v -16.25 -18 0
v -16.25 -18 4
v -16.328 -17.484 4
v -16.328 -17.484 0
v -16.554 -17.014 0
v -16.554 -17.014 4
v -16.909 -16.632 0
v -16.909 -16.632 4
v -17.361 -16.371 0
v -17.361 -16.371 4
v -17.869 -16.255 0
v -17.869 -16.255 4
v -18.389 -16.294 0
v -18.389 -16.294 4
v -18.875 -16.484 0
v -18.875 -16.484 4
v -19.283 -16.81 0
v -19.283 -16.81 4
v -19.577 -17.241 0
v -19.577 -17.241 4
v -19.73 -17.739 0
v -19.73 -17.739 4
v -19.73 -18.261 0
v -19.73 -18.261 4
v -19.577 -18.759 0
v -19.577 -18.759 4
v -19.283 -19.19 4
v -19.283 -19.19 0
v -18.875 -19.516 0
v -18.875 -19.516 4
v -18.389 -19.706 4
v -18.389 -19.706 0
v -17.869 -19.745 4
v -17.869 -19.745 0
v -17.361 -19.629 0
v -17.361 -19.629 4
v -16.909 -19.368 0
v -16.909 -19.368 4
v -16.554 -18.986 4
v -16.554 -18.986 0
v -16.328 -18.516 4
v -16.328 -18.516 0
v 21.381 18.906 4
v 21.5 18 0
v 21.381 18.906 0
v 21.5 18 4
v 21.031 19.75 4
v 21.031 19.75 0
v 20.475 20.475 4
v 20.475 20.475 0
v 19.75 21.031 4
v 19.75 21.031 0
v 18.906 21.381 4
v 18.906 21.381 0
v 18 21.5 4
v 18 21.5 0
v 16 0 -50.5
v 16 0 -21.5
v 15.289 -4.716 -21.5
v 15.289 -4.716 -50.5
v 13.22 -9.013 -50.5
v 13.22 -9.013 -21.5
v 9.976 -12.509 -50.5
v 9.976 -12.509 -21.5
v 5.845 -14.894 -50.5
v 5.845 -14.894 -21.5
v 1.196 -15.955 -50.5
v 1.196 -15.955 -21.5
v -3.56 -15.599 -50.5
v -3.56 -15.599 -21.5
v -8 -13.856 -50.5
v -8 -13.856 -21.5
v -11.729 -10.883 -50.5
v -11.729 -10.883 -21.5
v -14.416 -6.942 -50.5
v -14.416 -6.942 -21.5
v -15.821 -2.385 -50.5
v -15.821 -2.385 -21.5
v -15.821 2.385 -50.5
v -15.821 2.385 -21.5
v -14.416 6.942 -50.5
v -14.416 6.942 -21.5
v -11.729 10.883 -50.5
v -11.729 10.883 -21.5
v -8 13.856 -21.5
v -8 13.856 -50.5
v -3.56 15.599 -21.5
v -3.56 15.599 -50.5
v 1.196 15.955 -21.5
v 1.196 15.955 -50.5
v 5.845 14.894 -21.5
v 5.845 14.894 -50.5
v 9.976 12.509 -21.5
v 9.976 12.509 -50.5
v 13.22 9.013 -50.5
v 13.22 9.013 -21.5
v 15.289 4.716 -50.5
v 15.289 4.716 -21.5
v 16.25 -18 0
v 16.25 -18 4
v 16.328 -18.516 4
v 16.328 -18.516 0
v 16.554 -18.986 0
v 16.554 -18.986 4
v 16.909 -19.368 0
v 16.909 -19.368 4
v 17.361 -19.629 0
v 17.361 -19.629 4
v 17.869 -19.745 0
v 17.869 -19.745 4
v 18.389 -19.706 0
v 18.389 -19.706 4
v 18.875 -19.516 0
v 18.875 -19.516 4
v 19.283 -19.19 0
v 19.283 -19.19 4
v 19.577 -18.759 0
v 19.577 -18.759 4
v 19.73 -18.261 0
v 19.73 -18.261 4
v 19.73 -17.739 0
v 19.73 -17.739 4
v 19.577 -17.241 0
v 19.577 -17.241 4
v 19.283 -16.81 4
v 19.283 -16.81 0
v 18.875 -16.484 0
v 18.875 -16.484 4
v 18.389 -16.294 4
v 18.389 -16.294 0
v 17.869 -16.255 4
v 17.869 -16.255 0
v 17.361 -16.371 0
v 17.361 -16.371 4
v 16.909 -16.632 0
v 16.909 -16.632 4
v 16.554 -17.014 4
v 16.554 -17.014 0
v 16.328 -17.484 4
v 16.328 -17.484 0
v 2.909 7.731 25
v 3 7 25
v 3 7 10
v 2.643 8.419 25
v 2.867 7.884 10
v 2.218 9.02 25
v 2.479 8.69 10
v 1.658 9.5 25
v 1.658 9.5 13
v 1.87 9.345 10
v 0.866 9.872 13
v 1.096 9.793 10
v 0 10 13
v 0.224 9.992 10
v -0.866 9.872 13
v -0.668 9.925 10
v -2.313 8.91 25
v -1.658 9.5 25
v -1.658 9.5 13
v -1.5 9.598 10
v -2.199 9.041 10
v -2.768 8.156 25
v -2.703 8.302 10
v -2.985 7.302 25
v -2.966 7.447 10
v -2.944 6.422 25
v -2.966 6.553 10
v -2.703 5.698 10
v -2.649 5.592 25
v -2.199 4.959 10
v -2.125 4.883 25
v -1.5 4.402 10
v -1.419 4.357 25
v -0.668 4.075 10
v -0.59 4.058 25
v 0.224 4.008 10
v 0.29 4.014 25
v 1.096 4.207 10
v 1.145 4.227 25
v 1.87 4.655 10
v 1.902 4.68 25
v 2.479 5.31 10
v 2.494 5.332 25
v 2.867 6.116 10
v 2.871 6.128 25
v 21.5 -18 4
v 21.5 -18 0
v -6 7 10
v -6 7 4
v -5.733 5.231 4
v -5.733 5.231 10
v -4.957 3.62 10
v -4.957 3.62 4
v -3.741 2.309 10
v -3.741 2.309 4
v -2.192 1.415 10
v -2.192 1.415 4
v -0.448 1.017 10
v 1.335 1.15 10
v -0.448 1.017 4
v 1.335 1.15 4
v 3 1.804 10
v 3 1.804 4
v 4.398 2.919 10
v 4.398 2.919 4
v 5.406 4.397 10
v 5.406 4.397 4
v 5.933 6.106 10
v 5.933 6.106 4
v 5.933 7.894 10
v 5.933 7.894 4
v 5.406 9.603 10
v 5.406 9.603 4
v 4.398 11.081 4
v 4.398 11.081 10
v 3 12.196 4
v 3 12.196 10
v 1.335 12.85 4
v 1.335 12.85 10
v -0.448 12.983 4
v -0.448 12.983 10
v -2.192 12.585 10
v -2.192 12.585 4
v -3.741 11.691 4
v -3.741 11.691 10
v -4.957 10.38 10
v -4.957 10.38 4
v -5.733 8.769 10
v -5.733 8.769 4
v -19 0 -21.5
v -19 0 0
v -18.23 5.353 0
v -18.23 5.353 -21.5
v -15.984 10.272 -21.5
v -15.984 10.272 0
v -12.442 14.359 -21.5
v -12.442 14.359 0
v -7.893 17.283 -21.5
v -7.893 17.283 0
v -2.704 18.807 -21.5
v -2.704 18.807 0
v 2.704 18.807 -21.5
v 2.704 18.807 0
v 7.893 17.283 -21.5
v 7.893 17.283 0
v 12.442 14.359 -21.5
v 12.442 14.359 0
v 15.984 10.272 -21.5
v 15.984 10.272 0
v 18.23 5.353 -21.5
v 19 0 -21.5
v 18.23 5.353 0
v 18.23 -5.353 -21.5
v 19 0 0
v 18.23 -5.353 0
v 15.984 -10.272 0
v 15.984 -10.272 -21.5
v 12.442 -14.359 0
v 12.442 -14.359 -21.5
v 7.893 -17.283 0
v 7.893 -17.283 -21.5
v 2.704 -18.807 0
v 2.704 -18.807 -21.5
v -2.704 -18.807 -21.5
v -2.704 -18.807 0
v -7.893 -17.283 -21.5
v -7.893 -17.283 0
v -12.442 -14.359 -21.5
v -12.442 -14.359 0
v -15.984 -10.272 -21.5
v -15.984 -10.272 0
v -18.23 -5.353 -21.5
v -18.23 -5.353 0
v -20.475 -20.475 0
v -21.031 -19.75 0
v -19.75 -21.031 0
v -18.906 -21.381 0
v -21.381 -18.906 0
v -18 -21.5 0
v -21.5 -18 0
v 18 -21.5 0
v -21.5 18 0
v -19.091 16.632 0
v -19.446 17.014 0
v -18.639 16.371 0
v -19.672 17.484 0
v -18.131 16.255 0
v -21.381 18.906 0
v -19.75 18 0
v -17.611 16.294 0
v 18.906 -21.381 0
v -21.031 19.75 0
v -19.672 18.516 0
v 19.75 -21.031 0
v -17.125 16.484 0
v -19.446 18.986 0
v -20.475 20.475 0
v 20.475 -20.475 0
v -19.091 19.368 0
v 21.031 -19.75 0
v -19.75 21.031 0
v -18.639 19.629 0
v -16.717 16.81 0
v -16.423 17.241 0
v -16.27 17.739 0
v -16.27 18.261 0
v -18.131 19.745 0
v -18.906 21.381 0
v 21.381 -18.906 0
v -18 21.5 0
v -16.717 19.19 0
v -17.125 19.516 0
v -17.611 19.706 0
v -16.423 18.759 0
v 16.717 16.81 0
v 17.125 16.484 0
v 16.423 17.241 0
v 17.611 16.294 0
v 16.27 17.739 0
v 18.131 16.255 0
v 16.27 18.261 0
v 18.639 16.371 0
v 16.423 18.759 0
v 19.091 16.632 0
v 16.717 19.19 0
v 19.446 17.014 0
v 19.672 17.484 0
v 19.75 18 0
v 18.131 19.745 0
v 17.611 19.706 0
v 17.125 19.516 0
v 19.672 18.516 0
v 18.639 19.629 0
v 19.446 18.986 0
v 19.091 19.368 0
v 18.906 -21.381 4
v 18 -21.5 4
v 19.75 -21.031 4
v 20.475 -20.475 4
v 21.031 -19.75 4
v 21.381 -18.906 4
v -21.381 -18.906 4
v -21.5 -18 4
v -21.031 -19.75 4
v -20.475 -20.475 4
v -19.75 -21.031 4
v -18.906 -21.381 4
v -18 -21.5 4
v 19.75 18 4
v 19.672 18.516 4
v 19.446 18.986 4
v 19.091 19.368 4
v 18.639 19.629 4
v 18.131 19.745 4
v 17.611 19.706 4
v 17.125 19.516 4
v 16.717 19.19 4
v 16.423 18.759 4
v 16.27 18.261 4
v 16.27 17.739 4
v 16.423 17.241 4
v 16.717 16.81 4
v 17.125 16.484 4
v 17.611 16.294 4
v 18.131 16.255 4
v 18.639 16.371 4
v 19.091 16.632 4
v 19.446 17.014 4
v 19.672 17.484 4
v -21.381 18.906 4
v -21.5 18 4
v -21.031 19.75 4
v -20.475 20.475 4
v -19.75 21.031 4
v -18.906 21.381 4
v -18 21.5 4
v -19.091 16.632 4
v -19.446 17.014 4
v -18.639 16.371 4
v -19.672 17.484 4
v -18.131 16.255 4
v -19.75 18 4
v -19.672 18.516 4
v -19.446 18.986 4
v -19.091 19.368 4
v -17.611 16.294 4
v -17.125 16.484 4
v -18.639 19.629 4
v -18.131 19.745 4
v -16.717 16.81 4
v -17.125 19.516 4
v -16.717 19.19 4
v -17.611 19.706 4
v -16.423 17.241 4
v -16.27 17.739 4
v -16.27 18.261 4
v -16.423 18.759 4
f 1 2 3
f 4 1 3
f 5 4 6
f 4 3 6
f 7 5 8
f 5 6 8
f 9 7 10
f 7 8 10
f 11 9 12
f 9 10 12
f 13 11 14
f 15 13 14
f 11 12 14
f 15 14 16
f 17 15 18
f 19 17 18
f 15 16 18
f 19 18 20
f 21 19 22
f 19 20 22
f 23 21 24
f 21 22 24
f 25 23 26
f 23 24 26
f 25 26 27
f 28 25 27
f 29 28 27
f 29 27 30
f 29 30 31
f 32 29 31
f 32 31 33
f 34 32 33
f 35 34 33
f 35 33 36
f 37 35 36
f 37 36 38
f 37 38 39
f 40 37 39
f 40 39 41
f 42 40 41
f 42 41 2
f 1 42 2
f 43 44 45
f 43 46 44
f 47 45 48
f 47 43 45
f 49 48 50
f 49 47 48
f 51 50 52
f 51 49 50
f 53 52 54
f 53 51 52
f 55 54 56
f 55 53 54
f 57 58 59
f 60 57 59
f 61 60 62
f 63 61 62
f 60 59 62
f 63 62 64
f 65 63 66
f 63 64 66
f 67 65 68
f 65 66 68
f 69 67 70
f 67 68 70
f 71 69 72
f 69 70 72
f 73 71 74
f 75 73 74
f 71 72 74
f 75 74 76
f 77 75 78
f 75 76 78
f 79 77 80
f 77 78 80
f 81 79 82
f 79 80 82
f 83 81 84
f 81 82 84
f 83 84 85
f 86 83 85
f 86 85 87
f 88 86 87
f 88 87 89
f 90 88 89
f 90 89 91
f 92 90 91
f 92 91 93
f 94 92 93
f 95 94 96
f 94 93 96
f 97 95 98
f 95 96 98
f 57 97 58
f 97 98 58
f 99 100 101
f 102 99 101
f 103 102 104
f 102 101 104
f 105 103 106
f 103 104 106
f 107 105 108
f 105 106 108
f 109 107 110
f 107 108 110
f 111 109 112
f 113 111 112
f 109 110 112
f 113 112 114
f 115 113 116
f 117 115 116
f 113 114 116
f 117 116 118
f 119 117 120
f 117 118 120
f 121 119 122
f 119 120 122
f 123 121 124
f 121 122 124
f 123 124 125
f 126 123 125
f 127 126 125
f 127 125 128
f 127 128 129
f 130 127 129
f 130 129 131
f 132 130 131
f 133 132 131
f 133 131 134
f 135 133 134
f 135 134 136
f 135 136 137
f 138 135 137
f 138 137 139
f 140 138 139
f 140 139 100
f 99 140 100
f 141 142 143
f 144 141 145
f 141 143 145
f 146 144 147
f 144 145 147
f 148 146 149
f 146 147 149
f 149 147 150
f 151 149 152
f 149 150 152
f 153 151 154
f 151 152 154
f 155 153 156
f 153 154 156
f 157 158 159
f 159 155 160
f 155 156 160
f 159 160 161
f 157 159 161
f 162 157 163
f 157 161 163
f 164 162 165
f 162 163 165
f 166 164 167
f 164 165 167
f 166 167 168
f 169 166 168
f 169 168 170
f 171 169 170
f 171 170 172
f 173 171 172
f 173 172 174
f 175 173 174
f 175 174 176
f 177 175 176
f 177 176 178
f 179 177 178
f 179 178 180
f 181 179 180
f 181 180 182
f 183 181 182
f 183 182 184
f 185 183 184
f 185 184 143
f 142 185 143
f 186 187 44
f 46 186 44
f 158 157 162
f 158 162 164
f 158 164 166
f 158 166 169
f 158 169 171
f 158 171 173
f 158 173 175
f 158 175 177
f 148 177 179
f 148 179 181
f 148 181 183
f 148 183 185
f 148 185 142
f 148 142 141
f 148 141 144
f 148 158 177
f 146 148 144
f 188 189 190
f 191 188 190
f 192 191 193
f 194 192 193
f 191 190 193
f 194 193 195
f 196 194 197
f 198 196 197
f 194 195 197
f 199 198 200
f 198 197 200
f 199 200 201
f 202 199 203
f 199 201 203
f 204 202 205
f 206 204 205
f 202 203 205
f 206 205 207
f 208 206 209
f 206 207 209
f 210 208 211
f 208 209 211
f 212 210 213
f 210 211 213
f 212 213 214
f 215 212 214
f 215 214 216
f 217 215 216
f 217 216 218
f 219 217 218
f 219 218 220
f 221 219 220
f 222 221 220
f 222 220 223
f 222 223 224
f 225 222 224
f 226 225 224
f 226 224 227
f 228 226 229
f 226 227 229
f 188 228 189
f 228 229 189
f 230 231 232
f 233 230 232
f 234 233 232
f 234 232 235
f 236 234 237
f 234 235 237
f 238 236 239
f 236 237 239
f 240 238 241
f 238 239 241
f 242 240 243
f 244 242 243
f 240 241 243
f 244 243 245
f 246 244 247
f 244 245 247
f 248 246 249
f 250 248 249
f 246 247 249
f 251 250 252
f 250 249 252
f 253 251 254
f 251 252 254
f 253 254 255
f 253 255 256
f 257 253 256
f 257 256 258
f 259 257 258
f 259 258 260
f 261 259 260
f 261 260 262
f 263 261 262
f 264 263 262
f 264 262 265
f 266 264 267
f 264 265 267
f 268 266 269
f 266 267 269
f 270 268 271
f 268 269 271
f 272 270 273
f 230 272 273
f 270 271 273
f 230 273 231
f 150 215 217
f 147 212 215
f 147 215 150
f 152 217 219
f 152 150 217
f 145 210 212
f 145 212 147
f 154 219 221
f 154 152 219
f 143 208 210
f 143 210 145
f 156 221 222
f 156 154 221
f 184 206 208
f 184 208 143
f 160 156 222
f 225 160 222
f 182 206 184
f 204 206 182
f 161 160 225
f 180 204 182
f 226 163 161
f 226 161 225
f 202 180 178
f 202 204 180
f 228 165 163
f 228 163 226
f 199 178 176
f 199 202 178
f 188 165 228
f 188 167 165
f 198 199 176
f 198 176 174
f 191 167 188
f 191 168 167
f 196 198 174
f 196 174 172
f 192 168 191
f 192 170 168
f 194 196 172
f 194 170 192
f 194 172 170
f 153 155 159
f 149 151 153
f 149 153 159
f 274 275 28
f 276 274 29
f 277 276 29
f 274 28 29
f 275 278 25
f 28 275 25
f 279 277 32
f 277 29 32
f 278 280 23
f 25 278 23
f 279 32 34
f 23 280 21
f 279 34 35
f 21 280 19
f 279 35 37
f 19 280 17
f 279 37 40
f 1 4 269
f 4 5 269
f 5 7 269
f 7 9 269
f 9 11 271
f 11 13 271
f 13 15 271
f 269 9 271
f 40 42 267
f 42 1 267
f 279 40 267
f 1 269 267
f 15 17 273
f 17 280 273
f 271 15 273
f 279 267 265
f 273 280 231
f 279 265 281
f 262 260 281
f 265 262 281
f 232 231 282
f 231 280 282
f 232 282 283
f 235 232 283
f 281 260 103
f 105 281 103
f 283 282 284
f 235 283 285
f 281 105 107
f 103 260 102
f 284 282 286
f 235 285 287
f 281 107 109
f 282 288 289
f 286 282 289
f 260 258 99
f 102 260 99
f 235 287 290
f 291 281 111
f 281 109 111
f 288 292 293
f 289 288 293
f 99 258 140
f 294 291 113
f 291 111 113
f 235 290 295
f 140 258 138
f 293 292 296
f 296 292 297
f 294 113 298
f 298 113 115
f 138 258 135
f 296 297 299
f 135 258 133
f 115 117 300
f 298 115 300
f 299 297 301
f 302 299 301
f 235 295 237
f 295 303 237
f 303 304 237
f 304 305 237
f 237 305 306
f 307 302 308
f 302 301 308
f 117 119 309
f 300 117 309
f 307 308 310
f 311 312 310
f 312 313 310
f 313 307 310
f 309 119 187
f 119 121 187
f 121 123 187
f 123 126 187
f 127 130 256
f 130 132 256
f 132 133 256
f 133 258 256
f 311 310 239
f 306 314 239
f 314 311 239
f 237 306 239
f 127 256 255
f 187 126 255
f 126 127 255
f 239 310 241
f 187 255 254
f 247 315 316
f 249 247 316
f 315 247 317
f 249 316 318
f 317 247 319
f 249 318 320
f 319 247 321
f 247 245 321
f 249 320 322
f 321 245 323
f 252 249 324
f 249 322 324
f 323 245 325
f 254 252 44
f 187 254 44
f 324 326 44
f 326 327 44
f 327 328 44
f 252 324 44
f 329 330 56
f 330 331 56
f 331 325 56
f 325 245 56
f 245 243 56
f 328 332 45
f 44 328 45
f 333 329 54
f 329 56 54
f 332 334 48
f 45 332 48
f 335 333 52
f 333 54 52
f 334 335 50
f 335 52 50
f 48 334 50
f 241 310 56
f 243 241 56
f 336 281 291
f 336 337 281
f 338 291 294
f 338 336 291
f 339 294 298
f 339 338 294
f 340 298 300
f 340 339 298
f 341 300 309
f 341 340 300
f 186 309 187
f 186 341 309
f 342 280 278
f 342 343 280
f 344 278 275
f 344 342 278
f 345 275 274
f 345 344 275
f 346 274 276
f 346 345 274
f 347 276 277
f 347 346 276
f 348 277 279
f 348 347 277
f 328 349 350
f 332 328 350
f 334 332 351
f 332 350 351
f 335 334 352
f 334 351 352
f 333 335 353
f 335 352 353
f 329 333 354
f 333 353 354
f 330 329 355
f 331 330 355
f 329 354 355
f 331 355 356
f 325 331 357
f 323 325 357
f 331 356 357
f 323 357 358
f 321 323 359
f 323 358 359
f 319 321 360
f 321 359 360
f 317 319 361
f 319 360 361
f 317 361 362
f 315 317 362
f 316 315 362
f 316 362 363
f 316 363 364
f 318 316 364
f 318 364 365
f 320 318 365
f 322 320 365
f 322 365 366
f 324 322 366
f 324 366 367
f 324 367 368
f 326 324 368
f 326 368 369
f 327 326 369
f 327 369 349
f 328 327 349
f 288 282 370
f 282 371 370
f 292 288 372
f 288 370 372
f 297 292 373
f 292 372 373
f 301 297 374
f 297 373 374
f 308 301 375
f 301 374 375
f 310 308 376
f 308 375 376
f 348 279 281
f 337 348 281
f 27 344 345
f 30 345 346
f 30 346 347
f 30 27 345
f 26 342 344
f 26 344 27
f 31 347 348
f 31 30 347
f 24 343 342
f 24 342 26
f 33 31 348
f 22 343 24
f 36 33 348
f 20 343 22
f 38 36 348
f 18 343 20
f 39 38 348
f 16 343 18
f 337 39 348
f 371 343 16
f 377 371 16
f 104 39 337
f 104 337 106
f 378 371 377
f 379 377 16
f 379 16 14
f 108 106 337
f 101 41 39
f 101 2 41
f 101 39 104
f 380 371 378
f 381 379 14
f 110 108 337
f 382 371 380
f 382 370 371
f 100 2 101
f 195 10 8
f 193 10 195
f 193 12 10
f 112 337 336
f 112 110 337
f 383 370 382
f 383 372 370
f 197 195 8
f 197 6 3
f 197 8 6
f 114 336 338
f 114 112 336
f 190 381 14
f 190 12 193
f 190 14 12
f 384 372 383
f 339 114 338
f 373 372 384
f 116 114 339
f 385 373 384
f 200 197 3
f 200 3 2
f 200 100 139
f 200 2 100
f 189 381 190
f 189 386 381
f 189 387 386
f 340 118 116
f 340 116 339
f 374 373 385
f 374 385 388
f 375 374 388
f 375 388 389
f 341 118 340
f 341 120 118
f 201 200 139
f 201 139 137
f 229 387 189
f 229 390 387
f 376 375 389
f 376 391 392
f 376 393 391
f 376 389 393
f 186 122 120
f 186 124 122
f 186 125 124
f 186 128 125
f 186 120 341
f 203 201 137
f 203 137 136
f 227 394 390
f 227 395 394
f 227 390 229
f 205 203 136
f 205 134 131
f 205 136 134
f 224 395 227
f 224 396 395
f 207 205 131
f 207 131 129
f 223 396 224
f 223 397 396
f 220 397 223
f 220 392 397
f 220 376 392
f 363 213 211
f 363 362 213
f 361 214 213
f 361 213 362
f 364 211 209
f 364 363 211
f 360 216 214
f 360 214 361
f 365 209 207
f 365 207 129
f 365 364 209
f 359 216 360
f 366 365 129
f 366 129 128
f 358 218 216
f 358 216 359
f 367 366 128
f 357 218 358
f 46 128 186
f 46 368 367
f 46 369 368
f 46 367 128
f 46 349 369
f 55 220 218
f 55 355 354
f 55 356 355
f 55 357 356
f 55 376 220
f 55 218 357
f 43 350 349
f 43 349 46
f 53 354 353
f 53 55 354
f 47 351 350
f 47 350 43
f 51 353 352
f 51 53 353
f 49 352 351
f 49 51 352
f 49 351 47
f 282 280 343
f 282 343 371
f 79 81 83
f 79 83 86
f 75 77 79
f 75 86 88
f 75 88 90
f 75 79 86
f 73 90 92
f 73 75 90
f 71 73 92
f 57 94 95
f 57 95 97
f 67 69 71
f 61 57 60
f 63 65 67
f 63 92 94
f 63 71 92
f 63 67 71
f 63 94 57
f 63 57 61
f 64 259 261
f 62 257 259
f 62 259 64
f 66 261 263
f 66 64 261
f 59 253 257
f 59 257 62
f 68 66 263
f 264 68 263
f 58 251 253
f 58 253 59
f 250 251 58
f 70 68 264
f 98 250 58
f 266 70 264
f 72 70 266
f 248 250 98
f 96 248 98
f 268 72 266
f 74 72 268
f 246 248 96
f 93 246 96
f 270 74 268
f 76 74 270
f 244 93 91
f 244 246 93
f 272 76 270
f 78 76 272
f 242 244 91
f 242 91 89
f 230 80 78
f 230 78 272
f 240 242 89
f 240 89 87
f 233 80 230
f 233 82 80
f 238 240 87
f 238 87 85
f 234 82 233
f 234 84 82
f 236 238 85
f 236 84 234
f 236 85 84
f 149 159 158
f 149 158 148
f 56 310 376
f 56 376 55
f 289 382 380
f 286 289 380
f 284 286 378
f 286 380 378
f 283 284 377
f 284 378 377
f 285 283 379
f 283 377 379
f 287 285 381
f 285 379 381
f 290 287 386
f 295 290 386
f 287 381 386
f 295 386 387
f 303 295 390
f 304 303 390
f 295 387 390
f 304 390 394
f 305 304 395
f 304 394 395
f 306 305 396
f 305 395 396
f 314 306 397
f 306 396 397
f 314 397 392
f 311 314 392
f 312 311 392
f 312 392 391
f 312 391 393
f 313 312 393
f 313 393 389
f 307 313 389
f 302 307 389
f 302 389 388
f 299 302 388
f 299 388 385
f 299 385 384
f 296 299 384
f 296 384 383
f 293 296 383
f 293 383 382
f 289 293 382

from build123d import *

# Parameters (mm, degrees)
SKETCH_1_W          = 43
SKETCH_1_H          = 43
EXTRUDE_1_DEPTH     = 4
FILLET_1_R          = 3.5
SKETCH_2_R          = 1.75
CUT_EXTRUDE_1_DEPTH = 31.66757245
SKETCH_3_R          = 6
EXTRUDE_2_DEPTH     = 6
SKETCH_4_R          = 3
EXTRUDE_3_DEPTH     = 15
CUT_EXTRUDE_START   = -12
CUT_EXTRUDE_2_DEPTH = 12
SKETCH_6_R          = 19
EXTRUDE_4_DEPTH     = 21.5
SKETCH_7_R          = 16
EXTRUDE_5_DEPTH     = 29


with BuildPart() as part:
    # 스케치1 → 보스-돌출1 (new body)
    with BuildSketch(Plane.XY):
        Rectangle(SKETCH_1_W, SKETCH_1_H)
    extrude(amount=EXTRUDE_1_DEPTH)

    # 필렛1
    fillet_1_edges = [part.edges().sort_by_distance(p)[0] for p in [
        (21.5, -21.5, 2),
        (-21.5, -21.5, 2),
        (-21.5, 21.5, 2),
        (21.5, 21.5, 2),
    ]]
    fillet(fillet_1_edges, radius=FILLET_1_R)

    # 스케치2 → 컷-돌출1 (cut, through all)
    with BuildSketch(Plane.XY.offset(4)):
        with Locations((18, 18)):
            Circle(SKETCH_2_R)
        with Locations(Location((-18, 18, 0), (0, 0, 180))):
            Circle(SKETCH_2_R)
        with Locations(Location((18, -18, 0), (0, 0, 180))):
            Circle(SKETCH_2_R)
        with Locations((-18, -18)):
            Circle(SKETCH_2_R)
    extrude(amount=-CUT_EXTRUDE_1_DEPTH, mode=Mode.SUBTRACT)

    # 스케치3 → 보스-돌출2 (add)
    with BuildSketch(Plane.XY.offset(4)):
        with Locations(Location((0, 7, 0), (0, 0, 180))):
            Circle(SKETCH_3_R)
    extrude(amount=EXTRUDE_2_DEPTH)

    # 스케치4 → 보스-돌출3 (add)
    with BuildSketch(Plane.XY.offset(10)):
        with Locations((0, 7)):
            Circle(SKETCH_4_R)
    extrude(amount=EXTRUDE_3_DEPTH)

    # 스케치5 → 컷-돌출2 (cut)
    with BuildSketch(Plane.XY.offset(25).offset(CUT_EXTRUDE_START)):
        with BuildLine():
            Line((-1.658312395, 9.5), (1.658312395, 9.5))
            ThreePointArc((1.658312395, 9.5), (0, 10), (-1.658312395, 9.5))
        make_face()
    extrude(amount=CUT_EXTRUDE_2_DEPTH, mode=Mode.SUBTRACT)

    # 스케치6 → 보스-돌출4 (add)
    with BuildSketch(Plane(origin=(0, 0, 0), x_dir=(-1, 0, 0), z_dir=(0, 0, -1))):
        Circle(SKETCH_6_R)
    extrude(amount=EXTRUDE_4_DEPTH)

    # 스케치7 → 보스-돌출5 (add)
    with BuildSketch(Plane(origin=(0, 0, -21.5), x_dir=(-1, 0, 0), z_dir=(0, 0, -1))):
        with Locations(Location((0, 0, 0), (0, 0, 180))):
            Circle(SKETCH_7_R)
    extrude(amount=EXTRUDE_5_DEPTH)


solid = part.part
